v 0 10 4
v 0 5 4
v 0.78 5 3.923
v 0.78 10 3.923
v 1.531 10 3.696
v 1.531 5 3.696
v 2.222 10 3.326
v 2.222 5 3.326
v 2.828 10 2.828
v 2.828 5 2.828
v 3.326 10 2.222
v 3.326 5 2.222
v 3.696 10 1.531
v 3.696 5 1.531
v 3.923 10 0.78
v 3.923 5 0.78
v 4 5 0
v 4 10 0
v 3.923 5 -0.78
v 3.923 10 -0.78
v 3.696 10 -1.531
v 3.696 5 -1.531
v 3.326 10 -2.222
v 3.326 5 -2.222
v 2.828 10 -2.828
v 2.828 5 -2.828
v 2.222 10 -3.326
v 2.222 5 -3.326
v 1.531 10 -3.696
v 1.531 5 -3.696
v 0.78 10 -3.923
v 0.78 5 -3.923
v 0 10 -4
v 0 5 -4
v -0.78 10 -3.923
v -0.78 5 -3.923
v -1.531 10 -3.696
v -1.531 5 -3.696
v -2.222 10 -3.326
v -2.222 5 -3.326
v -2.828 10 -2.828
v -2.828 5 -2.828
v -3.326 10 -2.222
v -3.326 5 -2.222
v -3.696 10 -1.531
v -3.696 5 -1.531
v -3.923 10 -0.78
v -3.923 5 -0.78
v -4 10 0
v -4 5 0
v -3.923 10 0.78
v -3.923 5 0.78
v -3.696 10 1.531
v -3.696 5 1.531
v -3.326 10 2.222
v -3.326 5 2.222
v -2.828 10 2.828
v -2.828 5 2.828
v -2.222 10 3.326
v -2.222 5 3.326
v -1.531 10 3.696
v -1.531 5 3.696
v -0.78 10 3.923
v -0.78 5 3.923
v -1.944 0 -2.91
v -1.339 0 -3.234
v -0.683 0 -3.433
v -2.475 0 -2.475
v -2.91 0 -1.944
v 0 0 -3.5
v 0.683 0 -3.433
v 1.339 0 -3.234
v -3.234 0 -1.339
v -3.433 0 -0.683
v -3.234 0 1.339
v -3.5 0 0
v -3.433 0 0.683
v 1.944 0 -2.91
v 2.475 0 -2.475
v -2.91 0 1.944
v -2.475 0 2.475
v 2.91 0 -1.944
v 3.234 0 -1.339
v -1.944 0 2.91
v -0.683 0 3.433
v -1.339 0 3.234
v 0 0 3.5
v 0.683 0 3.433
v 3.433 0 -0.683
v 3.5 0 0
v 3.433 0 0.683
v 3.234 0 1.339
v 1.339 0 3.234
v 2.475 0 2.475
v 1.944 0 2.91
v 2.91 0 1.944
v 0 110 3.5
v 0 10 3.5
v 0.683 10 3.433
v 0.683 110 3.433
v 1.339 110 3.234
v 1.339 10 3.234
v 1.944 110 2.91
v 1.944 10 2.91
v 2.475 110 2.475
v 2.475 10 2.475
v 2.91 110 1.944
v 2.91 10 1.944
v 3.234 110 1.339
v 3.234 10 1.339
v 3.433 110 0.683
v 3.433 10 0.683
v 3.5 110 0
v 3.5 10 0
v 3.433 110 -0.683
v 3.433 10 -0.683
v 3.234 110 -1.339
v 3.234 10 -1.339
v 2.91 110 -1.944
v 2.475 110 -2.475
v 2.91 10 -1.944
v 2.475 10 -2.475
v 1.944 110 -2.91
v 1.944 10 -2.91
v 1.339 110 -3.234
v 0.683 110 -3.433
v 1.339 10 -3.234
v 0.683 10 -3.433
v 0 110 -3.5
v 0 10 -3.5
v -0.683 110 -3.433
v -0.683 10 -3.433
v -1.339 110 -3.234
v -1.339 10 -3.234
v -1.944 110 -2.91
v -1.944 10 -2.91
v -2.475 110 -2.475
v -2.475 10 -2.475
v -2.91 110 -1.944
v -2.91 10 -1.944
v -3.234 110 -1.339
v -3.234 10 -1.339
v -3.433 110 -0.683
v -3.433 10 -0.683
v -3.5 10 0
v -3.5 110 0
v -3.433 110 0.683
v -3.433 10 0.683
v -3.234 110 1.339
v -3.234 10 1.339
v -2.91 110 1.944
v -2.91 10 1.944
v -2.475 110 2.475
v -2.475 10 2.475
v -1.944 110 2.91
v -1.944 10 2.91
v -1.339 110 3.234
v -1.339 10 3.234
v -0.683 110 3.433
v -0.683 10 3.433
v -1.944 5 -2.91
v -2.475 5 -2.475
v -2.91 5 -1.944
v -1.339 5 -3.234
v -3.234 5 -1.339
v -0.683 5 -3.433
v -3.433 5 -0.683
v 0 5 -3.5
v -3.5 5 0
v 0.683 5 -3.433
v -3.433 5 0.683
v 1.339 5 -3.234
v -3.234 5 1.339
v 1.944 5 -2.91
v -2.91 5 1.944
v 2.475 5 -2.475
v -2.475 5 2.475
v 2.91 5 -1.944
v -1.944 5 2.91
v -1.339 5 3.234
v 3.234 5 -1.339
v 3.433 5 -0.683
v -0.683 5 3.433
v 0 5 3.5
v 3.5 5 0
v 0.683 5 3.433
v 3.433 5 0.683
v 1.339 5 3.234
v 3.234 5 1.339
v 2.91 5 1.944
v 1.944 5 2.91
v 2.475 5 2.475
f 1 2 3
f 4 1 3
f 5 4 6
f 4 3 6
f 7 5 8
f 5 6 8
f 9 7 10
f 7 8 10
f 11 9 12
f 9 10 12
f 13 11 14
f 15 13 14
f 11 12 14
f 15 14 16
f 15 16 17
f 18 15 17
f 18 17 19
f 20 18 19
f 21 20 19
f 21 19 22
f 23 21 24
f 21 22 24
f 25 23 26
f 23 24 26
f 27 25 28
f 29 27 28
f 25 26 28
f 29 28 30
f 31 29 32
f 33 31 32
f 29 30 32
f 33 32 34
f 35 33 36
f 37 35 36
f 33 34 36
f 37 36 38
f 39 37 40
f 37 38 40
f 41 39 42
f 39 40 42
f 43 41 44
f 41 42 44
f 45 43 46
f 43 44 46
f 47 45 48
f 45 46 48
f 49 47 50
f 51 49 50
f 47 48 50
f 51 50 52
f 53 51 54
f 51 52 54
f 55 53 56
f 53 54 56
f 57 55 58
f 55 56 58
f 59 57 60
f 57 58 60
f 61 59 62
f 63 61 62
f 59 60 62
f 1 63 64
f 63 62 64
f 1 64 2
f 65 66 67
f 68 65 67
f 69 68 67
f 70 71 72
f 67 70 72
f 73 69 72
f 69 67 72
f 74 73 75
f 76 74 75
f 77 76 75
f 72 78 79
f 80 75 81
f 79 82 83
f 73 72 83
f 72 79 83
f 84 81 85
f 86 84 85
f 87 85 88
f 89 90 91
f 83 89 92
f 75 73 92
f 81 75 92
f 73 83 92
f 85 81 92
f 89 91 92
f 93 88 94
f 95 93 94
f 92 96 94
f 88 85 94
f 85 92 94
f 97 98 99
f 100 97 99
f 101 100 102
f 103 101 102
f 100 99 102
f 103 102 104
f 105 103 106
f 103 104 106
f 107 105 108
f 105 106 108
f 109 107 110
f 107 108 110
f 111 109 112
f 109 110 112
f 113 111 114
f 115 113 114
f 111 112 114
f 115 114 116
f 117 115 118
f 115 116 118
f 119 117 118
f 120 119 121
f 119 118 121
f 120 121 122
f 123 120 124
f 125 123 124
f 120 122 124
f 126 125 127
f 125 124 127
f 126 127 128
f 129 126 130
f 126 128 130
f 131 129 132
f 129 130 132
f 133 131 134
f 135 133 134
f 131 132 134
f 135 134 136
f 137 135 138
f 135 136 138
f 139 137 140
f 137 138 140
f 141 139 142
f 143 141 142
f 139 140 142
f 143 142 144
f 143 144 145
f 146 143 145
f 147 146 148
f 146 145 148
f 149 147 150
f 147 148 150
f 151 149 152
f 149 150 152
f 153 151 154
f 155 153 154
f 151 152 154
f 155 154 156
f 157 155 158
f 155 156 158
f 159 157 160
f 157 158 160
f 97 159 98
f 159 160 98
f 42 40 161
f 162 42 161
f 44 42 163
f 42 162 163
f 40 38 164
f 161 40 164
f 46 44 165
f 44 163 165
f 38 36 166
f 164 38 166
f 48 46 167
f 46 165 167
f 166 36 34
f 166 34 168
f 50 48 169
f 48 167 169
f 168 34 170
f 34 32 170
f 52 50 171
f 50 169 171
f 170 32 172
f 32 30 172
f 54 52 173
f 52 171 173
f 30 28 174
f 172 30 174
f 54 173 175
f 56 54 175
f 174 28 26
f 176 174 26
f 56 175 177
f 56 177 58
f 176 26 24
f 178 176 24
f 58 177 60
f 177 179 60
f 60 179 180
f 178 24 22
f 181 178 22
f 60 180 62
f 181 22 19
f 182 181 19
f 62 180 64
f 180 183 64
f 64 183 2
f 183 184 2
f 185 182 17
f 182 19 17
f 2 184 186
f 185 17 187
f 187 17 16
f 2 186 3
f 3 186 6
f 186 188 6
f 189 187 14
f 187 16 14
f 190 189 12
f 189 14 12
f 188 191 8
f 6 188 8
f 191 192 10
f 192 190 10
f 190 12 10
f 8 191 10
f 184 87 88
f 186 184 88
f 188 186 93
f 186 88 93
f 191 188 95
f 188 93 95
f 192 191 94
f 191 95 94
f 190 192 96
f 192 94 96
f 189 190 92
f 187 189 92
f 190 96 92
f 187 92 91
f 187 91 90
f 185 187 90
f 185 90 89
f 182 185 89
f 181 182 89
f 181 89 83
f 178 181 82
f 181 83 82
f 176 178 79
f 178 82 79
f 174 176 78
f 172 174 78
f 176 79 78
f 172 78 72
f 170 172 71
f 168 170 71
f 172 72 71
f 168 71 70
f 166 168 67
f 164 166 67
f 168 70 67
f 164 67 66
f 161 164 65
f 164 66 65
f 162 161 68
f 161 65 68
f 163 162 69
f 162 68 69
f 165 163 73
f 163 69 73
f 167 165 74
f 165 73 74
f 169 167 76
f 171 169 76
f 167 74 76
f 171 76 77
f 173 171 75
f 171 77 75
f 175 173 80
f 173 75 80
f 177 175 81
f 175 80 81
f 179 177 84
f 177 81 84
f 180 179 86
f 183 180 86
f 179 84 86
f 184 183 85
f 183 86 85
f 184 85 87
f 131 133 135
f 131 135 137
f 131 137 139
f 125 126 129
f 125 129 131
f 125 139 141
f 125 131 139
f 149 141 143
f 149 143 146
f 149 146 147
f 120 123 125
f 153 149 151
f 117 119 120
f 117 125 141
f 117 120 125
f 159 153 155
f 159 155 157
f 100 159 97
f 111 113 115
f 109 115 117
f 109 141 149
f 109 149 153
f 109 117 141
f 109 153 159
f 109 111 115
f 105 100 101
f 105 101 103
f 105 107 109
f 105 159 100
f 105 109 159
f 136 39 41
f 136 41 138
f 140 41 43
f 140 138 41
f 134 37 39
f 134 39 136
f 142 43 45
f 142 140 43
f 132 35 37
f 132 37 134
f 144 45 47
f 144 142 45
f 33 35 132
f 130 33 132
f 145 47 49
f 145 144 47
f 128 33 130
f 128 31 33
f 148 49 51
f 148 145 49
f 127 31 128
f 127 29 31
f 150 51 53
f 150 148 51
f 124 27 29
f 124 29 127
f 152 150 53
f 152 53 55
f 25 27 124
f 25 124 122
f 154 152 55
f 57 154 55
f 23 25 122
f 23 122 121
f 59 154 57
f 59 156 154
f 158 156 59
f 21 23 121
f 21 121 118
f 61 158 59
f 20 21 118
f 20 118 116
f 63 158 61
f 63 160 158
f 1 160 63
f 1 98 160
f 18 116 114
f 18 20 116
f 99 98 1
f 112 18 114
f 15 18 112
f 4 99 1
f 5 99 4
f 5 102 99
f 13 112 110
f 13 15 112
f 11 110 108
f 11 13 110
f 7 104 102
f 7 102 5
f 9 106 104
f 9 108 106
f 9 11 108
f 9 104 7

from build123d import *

# Parameters (mm, degrees)
SKETCH1_R           = 3.5
BOSS_EXTRUDE1_DEPTH = 5
SKETCH2_R           = 4
BOSS_EXTRUDE2_DEPTH = 5
SKETCH3_R           = 3.5
BOSS_EXTRUDE3_DEPTH = 100


with BuildPart() as part:
    # Sketch1 → Boss-Extrude1 (new body)
    with BuildSketch(Plane(origin=(0, 0, 0), x_dir=(1, 0, 0), z_dir=(0, 1, 0))):
        with Locations(Location((0, 0, 0), (0, 0, 270))):  # turned: the seam where the file's is
            Circle(SKETCH1_R)
    extrude(amount=BOSS_EXTRUDE1_DEPTH)

    # Sketch2 → Boss-Extrude2 (add)
    with BuildSketch(Plane(origin=(0, 5, 0), x_dir=(1, 0, 0), z_dir=(0, 1, 0))):
        with Locations(Location((0, 0, 0), (0, 0, 270))):  # turned: the seam where the file's is
            Circle(SKETCH2_R)
    extrude(amount=BOSS_EXTRUDE2_DEPTH)

    # Sketch3 → Boss-Extrude3 (add)
    with BuildSketch(Plane(origin=(0, 10, 0), x_dir=(1, 0, 0), z_dir=(0, 1, 0))):
        with Locations(Location((0, 0, 0), (0, 0, 270))):  # turned: the seam where the file's is
            Circle(SKETCH3_R)
    extrude(amount=BOSS_EXTRUDE3_DEPTH)


solid = part.part
